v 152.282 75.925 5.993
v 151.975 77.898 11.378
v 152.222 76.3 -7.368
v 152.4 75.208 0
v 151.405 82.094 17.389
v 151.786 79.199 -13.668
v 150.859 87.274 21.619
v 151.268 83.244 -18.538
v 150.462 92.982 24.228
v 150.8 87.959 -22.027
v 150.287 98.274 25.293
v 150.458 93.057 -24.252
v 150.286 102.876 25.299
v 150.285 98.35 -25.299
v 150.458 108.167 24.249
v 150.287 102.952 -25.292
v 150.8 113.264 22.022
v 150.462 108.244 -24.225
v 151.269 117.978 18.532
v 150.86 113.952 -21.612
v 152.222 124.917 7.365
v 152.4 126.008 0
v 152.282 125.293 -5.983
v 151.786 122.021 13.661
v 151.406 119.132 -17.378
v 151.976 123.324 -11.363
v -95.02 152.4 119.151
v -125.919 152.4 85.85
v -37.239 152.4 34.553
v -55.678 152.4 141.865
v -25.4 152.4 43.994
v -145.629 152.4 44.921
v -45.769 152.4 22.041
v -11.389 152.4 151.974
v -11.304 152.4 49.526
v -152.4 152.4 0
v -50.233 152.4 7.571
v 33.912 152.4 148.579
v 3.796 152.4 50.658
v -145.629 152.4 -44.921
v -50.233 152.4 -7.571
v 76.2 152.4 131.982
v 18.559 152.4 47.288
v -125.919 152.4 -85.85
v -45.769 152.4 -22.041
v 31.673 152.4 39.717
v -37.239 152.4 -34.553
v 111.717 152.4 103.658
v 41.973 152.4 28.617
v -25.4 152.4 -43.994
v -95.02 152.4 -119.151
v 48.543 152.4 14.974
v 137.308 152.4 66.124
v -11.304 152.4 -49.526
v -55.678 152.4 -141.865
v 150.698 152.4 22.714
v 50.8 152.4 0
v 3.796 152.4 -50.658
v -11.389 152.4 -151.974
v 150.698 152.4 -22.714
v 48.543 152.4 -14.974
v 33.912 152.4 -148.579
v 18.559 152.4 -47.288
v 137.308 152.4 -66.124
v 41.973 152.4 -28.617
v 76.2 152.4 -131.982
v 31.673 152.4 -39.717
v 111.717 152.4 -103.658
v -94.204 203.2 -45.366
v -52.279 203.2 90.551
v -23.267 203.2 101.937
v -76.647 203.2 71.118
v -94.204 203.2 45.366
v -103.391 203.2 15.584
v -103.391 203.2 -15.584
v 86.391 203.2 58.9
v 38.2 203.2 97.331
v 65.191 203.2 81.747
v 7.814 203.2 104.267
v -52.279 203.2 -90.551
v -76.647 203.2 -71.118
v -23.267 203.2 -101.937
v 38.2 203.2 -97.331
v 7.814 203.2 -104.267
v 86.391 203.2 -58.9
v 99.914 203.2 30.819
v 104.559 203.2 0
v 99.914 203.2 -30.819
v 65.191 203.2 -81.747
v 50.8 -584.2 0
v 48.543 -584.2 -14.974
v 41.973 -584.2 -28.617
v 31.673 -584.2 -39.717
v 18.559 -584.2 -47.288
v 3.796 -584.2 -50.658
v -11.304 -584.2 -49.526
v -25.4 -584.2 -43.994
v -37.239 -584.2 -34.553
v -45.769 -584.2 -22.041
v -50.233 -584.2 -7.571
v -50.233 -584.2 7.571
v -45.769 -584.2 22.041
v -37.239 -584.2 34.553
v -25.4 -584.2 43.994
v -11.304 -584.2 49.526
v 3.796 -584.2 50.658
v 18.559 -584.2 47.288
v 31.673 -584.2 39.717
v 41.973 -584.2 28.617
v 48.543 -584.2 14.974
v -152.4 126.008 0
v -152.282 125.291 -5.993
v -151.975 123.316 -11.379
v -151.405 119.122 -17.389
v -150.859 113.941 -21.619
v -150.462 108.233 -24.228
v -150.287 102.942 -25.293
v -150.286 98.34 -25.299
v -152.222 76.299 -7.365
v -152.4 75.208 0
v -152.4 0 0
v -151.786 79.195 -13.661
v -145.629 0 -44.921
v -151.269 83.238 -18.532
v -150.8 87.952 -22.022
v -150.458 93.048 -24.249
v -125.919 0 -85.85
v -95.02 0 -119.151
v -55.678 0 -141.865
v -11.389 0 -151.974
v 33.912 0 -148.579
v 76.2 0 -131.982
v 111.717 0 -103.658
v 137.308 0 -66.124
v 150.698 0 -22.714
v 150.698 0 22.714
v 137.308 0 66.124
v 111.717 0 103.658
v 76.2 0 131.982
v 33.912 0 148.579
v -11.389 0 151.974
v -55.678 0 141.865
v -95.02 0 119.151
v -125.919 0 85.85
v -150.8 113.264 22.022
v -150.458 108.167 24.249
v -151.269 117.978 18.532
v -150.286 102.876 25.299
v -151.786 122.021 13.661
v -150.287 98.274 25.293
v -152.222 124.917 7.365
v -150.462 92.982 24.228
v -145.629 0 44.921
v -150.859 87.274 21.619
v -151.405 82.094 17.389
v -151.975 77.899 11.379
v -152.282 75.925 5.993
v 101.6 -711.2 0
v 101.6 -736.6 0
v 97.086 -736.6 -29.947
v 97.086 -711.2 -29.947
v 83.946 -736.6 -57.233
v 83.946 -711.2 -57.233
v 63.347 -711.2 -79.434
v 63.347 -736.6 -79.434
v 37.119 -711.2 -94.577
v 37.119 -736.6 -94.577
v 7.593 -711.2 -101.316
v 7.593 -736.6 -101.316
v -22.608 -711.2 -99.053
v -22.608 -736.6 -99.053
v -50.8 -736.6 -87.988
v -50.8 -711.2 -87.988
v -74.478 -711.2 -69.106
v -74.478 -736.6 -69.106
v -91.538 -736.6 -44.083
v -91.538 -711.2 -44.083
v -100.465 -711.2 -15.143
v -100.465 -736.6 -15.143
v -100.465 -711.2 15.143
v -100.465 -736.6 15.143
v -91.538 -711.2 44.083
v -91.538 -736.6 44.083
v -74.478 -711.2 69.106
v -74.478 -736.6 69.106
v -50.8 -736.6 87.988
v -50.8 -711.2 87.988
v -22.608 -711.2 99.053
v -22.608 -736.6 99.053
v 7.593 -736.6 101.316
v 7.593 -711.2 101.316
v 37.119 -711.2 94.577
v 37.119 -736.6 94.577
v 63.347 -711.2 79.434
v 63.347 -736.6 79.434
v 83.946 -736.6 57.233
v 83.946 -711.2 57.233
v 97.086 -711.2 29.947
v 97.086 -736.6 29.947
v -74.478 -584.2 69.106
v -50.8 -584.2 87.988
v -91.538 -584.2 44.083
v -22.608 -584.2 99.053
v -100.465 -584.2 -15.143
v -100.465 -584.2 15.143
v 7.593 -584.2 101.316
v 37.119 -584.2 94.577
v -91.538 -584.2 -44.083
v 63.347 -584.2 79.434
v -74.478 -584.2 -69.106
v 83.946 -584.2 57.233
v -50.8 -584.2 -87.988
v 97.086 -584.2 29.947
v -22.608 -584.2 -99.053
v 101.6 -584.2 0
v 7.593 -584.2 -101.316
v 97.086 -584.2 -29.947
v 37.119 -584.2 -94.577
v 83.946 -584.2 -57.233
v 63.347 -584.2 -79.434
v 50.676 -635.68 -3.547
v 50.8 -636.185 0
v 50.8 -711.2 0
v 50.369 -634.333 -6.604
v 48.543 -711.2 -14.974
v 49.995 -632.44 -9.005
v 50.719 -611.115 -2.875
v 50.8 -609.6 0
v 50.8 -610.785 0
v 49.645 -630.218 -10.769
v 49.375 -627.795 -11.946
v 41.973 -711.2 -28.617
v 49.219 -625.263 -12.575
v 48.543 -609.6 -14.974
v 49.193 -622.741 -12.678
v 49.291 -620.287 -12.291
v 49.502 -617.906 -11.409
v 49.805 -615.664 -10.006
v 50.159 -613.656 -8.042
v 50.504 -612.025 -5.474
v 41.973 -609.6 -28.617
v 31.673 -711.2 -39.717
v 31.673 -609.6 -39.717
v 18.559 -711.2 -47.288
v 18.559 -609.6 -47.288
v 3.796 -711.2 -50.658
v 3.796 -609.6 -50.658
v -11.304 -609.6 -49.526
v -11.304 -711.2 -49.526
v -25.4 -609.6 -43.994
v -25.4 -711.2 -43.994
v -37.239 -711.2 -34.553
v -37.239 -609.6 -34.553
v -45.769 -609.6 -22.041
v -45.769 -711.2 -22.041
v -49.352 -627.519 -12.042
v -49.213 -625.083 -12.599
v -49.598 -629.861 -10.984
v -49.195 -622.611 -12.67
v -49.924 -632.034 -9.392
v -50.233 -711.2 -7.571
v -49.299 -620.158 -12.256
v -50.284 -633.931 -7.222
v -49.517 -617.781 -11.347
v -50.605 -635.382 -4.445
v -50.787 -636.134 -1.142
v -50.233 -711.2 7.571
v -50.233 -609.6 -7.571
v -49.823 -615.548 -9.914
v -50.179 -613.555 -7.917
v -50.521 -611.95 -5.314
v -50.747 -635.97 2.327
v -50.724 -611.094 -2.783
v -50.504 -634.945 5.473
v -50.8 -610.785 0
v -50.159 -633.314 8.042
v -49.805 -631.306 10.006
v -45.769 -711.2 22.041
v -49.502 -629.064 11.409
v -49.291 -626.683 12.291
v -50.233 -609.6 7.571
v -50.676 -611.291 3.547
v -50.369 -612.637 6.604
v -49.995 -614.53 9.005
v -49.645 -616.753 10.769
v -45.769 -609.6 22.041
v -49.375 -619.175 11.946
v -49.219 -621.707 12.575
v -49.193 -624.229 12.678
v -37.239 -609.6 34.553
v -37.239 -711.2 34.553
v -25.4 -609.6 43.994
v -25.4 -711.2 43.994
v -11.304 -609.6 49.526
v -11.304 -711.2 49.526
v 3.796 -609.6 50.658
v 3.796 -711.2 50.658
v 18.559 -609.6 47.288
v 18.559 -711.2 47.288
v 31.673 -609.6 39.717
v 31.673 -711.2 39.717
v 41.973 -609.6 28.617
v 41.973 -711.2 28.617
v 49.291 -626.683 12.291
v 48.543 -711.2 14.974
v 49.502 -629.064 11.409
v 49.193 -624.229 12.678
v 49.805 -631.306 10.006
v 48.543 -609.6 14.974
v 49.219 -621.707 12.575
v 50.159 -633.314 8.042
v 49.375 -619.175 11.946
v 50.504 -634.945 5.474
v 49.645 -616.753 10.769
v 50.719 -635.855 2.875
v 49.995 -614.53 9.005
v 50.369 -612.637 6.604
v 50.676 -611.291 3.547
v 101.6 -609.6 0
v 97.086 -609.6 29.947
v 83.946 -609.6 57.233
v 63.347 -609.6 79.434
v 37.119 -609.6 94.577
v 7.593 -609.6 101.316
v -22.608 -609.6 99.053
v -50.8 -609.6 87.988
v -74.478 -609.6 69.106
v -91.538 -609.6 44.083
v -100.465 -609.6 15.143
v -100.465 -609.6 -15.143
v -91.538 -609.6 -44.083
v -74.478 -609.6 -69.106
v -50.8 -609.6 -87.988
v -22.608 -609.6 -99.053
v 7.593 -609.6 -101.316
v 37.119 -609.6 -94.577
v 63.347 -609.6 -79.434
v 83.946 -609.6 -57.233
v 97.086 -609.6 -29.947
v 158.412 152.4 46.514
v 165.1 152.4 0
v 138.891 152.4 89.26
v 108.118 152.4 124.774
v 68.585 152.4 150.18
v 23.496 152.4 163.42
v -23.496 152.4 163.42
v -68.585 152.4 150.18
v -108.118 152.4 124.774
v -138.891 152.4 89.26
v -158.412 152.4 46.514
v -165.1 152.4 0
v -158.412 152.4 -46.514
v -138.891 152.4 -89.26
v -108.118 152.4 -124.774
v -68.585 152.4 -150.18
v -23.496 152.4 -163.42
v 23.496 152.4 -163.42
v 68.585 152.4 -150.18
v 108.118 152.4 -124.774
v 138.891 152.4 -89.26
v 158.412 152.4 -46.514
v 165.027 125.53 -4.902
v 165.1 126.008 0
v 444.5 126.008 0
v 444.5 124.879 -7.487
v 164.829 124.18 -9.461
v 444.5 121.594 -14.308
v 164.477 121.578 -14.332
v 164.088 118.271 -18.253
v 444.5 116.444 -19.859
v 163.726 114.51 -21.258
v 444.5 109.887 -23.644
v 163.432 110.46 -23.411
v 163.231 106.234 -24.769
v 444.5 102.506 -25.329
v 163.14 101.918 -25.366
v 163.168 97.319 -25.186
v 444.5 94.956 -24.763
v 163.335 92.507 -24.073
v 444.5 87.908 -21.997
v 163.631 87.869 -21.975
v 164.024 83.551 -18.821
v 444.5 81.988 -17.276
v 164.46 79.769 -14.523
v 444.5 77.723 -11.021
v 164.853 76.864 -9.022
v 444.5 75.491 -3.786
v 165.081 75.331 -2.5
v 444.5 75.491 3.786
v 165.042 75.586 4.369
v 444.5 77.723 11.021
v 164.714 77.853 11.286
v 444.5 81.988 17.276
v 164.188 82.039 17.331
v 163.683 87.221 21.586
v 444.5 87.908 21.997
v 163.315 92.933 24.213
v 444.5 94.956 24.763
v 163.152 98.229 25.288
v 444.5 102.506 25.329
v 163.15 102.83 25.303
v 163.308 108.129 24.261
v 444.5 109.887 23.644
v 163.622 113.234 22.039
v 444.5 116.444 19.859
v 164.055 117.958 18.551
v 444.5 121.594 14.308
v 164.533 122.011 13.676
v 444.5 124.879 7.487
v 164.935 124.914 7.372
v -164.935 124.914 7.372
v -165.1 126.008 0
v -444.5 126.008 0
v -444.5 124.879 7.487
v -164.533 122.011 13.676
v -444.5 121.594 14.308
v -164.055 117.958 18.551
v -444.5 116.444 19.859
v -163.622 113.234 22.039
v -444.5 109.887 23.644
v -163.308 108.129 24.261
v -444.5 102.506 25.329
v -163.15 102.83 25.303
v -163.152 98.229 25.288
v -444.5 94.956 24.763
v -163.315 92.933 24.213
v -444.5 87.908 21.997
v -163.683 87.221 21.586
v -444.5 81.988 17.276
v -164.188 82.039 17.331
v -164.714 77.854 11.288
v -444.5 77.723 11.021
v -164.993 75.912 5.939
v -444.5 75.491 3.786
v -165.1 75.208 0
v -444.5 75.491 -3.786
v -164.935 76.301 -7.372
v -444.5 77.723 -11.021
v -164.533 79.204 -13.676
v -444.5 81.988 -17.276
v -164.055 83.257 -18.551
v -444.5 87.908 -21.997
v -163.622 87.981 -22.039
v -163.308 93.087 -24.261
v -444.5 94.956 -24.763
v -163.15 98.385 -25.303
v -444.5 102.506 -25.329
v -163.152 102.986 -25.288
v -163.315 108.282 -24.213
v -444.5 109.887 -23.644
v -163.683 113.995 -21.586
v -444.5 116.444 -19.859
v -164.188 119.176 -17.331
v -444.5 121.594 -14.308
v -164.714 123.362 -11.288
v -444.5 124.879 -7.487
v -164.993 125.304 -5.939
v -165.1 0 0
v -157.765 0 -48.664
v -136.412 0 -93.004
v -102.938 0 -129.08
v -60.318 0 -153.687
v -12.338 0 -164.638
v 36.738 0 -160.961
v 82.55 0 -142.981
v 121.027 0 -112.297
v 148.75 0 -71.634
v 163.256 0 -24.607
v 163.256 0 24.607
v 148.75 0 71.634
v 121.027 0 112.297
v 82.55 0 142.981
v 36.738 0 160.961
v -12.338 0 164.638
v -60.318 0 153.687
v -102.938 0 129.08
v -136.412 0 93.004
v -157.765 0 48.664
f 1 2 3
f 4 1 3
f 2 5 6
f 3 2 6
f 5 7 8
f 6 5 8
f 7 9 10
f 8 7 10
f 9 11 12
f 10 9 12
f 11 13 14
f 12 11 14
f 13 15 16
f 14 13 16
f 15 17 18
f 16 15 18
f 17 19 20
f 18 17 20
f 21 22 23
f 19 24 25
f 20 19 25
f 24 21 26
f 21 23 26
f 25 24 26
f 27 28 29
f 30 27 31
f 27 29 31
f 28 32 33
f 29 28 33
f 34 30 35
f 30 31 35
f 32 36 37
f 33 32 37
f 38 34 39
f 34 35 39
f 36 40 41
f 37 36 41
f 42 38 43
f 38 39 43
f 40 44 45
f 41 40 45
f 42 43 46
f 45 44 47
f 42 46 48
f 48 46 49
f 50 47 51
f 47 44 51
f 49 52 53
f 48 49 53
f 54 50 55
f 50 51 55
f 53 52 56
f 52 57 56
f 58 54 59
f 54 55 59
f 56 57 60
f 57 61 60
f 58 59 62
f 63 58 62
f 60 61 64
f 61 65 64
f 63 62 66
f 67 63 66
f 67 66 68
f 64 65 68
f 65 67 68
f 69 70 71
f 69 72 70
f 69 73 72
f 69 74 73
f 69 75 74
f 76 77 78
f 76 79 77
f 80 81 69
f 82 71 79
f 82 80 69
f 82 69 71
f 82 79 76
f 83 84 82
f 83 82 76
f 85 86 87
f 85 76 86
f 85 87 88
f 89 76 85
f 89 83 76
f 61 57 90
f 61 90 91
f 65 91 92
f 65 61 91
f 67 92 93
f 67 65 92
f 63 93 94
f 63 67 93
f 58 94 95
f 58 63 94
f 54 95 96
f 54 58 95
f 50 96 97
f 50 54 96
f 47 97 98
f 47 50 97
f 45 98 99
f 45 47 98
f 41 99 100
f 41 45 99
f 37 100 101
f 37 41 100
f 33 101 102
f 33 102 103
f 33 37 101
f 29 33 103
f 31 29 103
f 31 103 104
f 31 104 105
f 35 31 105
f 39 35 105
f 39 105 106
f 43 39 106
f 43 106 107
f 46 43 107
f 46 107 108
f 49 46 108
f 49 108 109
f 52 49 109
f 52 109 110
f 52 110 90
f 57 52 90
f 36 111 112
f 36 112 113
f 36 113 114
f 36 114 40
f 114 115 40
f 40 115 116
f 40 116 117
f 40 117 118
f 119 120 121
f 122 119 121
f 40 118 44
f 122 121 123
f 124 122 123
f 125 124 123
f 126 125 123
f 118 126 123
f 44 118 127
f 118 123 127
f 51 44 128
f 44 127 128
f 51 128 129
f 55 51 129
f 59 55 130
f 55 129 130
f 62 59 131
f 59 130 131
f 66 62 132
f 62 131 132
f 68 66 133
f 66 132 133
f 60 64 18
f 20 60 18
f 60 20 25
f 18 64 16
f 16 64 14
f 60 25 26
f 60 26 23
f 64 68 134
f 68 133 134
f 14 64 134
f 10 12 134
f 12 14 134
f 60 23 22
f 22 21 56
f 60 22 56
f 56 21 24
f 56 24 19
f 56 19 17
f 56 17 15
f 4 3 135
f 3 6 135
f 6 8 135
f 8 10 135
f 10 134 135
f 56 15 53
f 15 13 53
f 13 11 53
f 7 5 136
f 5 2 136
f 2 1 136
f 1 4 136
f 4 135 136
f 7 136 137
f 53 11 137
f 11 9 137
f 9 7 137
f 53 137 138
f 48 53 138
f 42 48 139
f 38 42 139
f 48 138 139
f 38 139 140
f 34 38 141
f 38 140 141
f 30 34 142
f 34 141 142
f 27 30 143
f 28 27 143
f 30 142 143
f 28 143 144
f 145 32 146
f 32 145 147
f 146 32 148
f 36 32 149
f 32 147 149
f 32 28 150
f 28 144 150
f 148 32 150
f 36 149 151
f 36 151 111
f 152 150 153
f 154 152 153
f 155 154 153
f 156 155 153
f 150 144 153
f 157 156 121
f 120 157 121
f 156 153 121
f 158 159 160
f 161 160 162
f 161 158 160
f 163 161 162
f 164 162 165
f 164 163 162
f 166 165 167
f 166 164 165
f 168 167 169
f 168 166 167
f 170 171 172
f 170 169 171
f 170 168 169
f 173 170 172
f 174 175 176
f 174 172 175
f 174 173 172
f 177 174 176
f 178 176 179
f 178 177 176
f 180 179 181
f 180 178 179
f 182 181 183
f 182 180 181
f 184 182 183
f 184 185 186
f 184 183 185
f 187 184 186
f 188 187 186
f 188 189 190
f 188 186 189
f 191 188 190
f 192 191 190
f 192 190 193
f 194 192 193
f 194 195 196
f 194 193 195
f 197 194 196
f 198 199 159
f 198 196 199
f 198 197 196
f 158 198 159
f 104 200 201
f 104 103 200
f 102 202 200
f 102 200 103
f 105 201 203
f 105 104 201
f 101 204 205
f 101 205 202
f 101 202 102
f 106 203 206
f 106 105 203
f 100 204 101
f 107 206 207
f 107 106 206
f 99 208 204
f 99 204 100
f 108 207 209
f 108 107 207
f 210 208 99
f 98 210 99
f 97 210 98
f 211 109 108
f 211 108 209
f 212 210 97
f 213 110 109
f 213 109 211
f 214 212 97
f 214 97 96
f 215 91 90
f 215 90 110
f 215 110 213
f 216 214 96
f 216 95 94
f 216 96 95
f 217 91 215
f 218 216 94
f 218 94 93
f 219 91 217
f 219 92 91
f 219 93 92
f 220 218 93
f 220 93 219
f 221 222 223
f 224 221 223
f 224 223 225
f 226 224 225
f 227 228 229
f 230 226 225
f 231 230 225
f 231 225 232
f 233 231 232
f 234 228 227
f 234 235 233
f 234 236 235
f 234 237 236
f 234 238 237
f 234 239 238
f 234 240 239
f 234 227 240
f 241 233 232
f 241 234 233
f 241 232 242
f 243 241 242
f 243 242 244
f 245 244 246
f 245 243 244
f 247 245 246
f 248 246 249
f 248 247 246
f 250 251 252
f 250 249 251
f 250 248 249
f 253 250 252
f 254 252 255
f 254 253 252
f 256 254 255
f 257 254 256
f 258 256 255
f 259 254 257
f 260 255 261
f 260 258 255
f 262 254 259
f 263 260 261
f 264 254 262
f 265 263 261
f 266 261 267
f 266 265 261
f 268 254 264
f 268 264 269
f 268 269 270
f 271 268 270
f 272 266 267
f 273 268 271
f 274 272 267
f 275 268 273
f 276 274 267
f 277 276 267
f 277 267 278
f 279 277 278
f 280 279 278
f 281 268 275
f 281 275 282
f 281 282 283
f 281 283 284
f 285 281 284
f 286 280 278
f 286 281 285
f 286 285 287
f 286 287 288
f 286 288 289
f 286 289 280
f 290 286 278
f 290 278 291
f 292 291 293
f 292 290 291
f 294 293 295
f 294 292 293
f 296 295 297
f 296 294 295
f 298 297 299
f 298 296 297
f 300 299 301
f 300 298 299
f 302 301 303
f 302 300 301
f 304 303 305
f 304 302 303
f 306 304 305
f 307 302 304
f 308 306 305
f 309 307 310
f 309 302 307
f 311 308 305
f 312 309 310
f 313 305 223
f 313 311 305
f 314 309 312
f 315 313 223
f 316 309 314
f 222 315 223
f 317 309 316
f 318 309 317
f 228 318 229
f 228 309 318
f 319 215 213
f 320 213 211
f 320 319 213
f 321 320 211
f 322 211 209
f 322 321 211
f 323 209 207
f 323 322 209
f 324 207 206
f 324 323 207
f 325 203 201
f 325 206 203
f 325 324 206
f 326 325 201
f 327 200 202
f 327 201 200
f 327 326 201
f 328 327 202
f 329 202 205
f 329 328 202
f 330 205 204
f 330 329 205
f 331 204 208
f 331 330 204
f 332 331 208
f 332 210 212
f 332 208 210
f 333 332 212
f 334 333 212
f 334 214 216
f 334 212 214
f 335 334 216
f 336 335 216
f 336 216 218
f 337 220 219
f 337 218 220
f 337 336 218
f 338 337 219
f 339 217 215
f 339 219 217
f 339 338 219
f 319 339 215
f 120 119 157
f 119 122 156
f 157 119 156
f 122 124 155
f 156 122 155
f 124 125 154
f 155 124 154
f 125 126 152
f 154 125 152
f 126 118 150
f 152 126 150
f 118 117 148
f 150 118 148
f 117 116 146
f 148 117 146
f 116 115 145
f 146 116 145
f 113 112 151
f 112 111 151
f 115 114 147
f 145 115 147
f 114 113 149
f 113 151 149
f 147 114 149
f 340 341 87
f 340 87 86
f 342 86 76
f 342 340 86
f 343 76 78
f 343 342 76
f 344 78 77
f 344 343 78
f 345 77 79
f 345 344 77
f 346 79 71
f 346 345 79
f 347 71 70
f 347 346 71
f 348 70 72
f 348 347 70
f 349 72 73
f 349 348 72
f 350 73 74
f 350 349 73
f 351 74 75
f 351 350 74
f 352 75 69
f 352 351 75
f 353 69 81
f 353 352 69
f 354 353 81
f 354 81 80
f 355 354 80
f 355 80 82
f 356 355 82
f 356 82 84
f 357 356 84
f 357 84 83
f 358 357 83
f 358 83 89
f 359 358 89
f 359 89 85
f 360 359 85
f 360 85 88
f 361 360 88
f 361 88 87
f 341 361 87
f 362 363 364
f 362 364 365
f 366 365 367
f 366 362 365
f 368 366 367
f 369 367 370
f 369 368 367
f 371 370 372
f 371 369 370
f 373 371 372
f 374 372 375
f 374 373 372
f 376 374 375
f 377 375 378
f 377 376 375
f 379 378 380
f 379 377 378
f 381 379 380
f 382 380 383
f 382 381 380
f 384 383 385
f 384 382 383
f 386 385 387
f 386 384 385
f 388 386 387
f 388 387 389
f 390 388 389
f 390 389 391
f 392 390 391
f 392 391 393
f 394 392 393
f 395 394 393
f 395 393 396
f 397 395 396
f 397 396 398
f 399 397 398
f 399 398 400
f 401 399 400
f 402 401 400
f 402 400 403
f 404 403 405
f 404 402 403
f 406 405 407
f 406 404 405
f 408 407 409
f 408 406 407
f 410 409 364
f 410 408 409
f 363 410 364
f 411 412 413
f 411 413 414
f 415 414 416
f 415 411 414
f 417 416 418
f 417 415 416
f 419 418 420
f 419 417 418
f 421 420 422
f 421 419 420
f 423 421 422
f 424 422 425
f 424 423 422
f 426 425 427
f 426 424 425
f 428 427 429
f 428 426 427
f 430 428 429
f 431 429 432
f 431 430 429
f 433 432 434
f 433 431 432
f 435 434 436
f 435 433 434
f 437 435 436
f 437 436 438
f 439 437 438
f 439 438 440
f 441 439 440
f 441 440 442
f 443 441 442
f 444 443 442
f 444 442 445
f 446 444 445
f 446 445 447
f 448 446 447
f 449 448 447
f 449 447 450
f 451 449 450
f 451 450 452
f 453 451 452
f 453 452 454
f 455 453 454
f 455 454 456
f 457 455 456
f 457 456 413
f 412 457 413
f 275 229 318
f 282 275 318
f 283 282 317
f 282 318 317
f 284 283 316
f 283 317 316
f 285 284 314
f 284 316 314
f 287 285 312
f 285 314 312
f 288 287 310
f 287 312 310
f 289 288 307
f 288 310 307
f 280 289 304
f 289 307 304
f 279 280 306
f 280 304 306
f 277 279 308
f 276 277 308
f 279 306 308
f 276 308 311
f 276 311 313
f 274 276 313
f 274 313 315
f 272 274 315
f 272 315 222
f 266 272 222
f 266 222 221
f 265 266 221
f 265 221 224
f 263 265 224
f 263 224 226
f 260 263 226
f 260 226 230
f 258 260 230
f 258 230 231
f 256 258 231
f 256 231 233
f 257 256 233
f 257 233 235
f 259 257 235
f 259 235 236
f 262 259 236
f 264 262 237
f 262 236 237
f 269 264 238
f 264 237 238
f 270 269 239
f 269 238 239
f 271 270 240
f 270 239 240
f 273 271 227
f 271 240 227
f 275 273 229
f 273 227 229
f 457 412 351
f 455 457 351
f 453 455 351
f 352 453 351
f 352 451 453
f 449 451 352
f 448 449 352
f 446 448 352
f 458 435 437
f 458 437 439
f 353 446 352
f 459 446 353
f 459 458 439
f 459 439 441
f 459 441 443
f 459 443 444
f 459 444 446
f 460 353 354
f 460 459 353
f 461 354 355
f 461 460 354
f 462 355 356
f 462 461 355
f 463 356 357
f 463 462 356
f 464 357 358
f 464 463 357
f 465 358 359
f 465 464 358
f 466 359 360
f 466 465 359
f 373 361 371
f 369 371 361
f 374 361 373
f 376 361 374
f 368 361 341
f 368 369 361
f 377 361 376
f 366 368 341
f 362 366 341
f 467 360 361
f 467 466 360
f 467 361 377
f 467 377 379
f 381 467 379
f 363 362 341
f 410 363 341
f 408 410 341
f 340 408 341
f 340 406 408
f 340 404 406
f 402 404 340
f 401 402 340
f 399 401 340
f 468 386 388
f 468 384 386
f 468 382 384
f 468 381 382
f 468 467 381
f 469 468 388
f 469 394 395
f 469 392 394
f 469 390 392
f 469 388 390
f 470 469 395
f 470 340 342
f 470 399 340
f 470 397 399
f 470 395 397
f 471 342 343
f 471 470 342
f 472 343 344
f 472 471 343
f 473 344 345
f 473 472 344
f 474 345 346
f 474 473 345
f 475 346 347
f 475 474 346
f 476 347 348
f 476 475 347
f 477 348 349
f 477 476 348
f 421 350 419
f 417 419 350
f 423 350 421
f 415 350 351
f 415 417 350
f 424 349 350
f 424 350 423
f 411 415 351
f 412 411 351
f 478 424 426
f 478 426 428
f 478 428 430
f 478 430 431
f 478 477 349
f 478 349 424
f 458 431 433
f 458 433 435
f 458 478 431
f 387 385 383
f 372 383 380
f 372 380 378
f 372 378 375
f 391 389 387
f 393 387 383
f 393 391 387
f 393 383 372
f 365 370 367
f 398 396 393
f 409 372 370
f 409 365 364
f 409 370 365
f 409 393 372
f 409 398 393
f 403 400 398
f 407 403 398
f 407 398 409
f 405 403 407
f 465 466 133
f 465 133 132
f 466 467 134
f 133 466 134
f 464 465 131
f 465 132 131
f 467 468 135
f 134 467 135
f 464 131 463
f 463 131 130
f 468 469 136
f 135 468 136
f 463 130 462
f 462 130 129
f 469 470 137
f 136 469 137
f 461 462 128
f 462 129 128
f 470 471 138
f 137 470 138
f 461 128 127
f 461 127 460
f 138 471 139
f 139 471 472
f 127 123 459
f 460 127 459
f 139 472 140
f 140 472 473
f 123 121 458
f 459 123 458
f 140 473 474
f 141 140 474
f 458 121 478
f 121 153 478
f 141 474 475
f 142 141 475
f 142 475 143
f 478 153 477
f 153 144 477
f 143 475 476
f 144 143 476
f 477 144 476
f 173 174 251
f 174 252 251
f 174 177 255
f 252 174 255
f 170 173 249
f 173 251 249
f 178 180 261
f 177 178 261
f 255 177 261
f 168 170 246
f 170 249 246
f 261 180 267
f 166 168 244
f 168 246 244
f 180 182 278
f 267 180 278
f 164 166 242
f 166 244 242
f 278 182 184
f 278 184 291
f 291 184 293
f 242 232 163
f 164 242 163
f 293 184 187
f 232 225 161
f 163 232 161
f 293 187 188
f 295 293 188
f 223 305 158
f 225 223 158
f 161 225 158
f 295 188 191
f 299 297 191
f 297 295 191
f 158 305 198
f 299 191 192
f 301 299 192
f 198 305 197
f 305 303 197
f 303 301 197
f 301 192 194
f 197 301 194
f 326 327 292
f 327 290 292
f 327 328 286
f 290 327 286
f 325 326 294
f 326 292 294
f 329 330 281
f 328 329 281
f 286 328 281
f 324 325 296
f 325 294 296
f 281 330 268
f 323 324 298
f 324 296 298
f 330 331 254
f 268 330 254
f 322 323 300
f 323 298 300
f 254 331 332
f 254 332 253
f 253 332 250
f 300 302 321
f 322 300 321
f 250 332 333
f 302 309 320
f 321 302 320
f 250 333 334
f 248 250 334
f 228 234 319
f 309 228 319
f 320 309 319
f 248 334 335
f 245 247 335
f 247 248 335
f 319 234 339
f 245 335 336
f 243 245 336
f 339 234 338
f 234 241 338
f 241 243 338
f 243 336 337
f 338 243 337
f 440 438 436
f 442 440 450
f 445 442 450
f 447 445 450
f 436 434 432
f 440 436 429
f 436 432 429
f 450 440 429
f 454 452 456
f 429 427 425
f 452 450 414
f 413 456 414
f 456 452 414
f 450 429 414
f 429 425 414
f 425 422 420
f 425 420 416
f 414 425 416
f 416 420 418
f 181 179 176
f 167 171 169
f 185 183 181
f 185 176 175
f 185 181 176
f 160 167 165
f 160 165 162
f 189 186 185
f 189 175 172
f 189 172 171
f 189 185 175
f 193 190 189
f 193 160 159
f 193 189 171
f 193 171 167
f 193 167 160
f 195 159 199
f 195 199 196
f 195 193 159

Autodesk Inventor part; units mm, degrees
ref_plane "YZ Plane" through (0, 0, 0) normal (1, 0, 0) x (0, 1, 0)
ref_plane "XZ Plane" through (0, 0, 0) normal (0, 1, 0) x (-1, 0, 0)
ref_plane "XY Plane" through (0, 0, 0) normal (0, 0, 1) x (1, 0, 0)
sketch "Sketch1" plane through (0, 0, 0) normal (0, 1, 0) x (-1, 0, 0)
  circle A0 centre (0, 0) radius 152.4
  circle A1 centre (0, 0) radius 165.1
  dimension "d0" = 304.8
  dimension "d1" = 330.2
extrude "Extrusion1" add sketch "Sketch1" along normal blind 152.4
sketch "Sketch2" plane through (0, 0, 0) normal (1, 0, 0) x (0, 1, 0)
  circle A0 centre (100.6077, 0) radius 25.4
  point P0 (0, 0)
  dimension "d4" = 50.8
extrude "Extrusion2" add sketch "Sketch2" along normal mid plane 889
sketch "Sketch4" plane through (0, 152.4, 0) normal (0, 1, 0) x (1, 0, 0)
  circle A0 centre (0, 0) radius 152.4
extrude "Extrusion4" cut sketch "Sketch4" against normal through all
sketch "Sketch5" plane through (0, 152.4, 0) normal (0, 1, 0) x (1, 0, 0)
  circle A0 centre (0, 0) radius 165.1
extrude "Extrusion5" add sketch "Sketch5" along normal blind 50.8 draft -50
sketch "Sketch6" plane through (0, 152.4, 0) normal (0, -1, 0) x (1, 0, 0)
  circle A0 centre (0, 0) radius 104.5589 projected
  circle A1 centre (0, 0) radius 50.8
  dimension "d15" = 101.6
extrude "Extrusion6" add sketch "Sketch6" along normal blind 863.6 contours A1
sketch "Sketch7" plane through (0, -711.2, 0) normal (0, -1, 0) x (1, 0, 0)
  circle A0 centre (0, 0) radius 104.5589 projected
  circle A1 centre (0, 0) radius 101.6
  dimension "d18" = 203.2
extrude "Extrusion7" add sketch "Sketch7" along normal blind 25.4 contours A1
ref_plane "Work Plane1" through (0, -609.6, 0) normal (0, 1, 0) x (1, 0, 0)
sketch "Sketch8" plane through (0, -609.6, 0) normal (0, 1, 0) x (1, 0, 0)
  circle A0 centre (0, 0) radius 101.6
  dimension "d22" = 203.2
extrude "Extrusion8" add sketch "Sketch8" along normal blind 25.4
ref_plane "Work Plane2" through (75.376, -18.8821, -44.9646) normal (1, 0, 0) x (0, 1, 0)
sketch "Sketch9" plane through (75.376, -18.8821, -44.9646) normal (1, 0, 0) x (0, 1, 0)
  circle A0 centre (-604.603, 44.9646) radius 12.7
  point P0 (18.8821, 44.9646)
  dimension "d25" = 25.4
extrude "Extrusion9" cut sketch "Sketch9" against normal through all
properties part number "capistan upper"
